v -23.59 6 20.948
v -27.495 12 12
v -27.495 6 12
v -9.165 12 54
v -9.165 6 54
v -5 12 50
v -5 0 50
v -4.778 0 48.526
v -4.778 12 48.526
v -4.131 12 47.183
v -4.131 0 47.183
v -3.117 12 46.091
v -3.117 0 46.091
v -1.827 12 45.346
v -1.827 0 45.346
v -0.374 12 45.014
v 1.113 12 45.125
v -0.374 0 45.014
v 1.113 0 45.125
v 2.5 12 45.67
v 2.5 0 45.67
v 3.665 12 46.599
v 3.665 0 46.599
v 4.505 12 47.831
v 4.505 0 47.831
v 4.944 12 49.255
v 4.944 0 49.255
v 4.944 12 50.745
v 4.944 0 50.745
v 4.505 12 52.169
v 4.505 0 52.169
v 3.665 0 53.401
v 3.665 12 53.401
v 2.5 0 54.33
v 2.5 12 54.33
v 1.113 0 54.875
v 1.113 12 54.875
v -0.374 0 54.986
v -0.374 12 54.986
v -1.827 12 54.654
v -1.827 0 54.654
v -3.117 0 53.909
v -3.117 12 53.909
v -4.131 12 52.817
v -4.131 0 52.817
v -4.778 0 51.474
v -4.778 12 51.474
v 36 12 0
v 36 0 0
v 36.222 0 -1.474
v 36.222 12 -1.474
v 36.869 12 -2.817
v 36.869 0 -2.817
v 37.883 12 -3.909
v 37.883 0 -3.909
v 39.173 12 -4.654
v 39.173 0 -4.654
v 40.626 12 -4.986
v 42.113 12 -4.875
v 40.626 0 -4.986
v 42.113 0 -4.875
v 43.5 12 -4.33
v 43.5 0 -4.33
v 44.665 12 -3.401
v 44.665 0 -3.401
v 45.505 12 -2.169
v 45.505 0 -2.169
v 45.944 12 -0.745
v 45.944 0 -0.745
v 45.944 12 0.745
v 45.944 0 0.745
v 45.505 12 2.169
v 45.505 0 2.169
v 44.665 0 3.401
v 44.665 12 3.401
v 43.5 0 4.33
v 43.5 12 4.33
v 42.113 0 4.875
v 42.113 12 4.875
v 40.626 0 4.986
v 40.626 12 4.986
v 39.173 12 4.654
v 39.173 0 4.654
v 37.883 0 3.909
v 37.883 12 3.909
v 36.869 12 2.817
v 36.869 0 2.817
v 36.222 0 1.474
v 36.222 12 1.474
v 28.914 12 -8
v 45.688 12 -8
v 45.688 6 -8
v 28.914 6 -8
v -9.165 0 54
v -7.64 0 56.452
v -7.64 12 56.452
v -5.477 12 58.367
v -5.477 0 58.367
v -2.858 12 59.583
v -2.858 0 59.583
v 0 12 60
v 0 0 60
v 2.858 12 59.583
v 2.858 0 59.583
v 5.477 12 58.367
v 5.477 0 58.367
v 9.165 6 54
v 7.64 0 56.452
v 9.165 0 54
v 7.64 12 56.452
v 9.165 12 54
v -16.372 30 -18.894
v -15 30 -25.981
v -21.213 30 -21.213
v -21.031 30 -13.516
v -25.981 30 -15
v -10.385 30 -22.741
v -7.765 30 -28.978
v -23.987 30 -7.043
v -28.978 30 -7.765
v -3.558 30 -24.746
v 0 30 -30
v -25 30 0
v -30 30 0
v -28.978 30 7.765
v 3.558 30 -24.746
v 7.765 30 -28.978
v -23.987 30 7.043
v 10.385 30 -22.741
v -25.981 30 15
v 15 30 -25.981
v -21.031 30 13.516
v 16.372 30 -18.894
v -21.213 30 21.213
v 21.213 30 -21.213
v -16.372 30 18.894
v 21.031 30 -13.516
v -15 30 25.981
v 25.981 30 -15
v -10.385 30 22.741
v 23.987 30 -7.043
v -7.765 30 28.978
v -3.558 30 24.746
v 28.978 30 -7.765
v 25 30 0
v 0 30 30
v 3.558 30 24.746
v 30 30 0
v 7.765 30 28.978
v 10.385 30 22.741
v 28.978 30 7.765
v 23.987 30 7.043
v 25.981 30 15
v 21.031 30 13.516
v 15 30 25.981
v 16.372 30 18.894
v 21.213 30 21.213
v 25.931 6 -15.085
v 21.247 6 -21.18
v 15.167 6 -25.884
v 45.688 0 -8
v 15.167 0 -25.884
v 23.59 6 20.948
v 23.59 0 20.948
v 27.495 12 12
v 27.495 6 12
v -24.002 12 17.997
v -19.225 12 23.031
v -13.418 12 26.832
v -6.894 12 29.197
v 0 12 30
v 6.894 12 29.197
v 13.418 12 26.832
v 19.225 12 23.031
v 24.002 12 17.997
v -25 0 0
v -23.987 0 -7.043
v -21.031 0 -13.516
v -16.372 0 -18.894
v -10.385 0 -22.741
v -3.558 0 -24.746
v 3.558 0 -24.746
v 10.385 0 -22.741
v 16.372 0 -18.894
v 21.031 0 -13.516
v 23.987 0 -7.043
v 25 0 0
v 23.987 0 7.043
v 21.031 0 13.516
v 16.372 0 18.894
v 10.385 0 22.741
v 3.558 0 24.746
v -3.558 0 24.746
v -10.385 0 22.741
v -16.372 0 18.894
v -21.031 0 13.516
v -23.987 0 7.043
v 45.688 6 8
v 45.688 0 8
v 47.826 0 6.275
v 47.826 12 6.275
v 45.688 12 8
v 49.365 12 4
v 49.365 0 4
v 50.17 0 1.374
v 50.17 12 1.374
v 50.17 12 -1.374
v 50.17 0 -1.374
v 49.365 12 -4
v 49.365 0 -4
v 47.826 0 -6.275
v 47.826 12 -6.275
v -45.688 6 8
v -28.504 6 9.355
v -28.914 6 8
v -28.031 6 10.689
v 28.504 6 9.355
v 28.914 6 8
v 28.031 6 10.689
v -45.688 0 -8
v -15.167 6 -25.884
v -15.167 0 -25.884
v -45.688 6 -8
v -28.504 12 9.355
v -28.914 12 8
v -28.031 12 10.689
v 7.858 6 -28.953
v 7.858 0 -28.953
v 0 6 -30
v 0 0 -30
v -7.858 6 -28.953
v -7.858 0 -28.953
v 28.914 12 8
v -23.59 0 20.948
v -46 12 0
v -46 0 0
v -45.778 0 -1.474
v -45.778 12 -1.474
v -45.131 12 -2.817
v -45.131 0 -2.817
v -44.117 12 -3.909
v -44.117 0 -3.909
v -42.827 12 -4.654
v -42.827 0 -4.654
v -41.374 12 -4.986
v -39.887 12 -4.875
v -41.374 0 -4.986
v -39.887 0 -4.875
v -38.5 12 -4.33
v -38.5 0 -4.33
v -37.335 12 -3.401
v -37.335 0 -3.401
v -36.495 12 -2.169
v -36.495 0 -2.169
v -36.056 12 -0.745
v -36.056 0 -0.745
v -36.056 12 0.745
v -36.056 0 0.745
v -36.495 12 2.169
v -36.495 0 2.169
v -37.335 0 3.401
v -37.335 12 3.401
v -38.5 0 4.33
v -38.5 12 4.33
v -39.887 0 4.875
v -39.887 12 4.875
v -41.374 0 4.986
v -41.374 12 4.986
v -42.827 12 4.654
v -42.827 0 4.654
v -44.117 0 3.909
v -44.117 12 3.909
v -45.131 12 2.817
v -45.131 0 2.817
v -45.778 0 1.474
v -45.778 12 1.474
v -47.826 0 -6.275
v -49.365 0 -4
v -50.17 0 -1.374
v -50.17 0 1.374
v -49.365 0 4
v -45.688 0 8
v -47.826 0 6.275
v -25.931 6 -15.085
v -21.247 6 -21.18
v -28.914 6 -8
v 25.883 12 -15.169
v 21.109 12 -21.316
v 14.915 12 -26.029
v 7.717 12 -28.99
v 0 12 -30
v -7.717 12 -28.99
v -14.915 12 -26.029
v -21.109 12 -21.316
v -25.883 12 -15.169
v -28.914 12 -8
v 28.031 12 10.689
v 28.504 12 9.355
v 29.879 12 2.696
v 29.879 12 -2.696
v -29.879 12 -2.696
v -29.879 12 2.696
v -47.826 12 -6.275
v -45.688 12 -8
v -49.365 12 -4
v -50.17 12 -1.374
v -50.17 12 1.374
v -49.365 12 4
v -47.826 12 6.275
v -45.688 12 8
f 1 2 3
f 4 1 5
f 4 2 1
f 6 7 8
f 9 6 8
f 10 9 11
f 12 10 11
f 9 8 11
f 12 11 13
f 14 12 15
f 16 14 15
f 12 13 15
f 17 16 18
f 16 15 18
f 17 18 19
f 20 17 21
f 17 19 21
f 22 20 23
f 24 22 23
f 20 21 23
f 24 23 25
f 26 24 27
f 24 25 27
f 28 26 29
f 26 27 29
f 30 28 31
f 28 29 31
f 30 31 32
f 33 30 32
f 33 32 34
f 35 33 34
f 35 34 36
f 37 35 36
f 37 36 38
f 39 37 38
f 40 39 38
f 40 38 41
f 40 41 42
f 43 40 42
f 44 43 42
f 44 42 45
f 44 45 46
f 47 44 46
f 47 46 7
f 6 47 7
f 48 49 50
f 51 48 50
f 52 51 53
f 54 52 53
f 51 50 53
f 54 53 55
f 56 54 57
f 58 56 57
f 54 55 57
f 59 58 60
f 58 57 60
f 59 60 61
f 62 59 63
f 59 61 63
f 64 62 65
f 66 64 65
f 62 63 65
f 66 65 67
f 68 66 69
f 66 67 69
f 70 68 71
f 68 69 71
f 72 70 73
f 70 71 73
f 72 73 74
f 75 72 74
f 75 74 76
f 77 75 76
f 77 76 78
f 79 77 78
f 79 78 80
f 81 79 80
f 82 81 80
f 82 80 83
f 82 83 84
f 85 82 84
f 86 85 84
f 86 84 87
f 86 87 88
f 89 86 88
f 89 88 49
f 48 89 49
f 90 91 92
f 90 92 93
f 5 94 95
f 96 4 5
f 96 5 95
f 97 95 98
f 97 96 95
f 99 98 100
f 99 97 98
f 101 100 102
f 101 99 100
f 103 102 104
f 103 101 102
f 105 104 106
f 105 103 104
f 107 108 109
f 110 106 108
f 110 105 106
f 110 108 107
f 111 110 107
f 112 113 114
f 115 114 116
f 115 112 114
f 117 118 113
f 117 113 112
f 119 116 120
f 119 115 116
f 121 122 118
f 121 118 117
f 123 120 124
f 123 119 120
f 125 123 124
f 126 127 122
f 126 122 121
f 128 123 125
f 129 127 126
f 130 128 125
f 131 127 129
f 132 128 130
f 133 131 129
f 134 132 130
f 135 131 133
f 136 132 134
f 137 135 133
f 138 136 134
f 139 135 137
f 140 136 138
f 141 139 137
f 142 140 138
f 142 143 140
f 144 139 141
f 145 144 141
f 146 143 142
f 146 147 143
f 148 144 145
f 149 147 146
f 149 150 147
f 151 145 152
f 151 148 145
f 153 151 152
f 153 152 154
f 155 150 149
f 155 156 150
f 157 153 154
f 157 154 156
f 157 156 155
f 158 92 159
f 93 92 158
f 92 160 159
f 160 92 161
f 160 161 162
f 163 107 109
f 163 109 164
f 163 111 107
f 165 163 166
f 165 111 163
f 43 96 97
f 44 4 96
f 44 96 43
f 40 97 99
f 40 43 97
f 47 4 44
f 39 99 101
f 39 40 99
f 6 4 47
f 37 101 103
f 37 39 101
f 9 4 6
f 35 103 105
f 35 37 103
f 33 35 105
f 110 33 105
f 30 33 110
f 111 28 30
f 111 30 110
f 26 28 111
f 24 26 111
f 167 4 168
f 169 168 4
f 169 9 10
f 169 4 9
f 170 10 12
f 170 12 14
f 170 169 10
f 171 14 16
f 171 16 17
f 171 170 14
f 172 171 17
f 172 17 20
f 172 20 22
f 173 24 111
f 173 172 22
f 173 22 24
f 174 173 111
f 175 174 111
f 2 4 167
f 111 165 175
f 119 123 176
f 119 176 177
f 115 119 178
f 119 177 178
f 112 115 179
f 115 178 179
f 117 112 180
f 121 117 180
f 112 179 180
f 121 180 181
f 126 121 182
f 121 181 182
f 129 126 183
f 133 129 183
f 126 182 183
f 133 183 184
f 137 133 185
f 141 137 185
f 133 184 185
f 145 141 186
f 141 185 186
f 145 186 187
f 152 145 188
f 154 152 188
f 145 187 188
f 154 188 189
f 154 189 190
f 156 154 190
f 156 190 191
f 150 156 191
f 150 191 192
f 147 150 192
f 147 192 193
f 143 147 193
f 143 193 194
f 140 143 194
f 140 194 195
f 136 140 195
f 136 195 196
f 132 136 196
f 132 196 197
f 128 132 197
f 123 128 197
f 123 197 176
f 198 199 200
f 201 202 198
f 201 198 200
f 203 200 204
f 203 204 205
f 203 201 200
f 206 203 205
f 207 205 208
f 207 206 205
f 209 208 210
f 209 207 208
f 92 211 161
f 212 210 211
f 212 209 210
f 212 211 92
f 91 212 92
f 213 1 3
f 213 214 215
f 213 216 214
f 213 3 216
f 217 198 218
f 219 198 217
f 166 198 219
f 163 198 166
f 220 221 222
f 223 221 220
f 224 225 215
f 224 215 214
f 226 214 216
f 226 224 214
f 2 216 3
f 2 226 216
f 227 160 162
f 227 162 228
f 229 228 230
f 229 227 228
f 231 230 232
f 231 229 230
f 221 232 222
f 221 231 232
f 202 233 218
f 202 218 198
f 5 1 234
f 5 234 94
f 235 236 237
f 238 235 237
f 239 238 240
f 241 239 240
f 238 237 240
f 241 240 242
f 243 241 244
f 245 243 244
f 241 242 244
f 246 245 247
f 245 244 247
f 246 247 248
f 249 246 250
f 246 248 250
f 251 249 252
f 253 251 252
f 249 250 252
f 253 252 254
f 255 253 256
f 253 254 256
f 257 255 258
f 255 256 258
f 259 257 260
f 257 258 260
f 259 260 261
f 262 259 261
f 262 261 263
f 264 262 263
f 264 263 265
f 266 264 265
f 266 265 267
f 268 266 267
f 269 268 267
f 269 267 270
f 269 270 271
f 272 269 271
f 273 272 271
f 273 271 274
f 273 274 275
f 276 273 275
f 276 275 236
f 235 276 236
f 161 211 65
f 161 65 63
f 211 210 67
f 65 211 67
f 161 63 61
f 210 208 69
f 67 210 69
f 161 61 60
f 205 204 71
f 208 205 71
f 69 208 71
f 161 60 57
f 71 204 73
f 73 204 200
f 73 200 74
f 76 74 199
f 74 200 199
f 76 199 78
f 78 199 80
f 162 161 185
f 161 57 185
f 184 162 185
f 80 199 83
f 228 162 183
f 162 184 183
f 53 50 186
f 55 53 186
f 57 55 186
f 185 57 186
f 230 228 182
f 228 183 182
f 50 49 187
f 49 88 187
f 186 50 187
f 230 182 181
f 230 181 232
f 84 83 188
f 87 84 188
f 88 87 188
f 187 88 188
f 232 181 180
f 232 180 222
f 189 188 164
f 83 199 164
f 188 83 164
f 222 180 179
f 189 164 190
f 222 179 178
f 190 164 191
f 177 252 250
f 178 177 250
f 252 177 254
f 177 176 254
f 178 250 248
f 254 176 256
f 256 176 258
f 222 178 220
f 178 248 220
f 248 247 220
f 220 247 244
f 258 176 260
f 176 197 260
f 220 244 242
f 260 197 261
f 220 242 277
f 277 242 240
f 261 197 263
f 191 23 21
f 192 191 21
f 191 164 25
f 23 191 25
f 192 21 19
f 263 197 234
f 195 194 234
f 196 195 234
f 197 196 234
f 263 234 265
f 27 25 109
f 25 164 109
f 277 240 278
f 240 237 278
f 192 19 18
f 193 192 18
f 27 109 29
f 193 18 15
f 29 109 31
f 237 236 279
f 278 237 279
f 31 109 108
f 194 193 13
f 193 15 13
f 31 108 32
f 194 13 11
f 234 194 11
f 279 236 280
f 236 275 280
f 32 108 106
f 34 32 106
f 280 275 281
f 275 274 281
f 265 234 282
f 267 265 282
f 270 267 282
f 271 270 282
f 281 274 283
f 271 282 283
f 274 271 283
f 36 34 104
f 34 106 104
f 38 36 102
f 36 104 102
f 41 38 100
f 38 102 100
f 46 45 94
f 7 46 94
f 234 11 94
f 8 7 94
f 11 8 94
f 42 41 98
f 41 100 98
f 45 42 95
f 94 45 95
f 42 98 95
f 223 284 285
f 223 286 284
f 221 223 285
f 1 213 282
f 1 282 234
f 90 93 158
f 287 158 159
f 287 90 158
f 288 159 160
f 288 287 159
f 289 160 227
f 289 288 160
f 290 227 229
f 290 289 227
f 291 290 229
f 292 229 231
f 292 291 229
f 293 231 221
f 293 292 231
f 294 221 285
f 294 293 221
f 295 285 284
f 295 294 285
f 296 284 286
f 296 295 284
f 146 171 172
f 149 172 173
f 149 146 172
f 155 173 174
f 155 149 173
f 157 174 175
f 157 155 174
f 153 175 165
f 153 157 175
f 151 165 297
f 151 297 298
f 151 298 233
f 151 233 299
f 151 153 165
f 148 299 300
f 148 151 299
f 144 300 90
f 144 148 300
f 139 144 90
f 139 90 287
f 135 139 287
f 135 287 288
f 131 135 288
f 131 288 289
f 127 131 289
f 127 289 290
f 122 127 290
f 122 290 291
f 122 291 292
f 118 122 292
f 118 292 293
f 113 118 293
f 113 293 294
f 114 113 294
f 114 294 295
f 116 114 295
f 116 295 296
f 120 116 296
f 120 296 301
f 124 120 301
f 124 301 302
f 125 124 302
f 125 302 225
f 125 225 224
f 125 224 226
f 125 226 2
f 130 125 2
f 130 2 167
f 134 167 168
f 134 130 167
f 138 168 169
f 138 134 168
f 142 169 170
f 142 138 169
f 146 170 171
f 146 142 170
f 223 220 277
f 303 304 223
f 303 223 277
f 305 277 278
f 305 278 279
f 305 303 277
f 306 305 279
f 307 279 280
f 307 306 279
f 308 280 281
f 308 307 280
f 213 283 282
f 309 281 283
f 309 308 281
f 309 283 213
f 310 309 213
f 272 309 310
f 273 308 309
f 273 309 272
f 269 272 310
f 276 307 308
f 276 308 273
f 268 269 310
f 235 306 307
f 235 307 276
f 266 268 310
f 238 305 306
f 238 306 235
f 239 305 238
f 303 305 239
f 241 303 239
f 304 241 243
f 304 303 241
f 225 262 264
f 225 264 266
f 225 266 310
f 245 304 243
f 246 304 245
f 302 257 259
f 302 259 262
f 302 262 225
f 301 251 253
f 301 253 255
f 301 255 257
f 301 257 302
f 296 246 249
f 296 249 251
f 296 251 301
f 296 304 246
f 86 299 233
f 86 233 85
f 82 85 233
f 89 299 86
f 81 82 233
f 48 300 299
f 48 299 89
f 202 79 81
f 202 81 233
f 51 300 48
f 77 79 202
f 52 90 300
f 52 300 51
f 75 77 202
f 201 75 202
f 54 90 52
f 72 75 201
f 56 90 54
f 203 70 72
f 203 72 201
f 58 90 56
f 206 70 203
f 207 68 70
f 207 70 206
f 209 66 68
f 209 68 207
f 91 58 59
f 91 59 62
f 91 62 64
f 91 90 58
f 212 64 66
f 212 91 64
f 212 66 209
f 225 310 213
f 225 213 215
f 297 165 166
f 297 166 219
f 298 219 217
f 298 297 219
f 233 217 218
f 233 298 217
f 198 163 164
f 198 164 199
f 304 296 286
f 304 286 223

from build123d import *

# Parameters (mm, degrees)
BOSS_EXTRUDE1_DEPTH        = 6
BOSS_EXTRUDE2_DEPTH        = 6
BOSS_EXTRUDE3_START        = 18
SKETCH3_R                  = 30
BOSS_EXTRUDE3_DEPTH        = 18
F_10_0_10_DIAMETER_HOLE1_D = 10
M45_CLEARANCE_HOLE1_D      = 50


with BuildPart() as part:
    # Sketch1 → Boss-Extrude1 (new body)
    with BuildSketch(Plane(origin=(0, 12, 0), x_dir=(1, 0, 0), z_dir=(0, 1, 0))):
        with BuildLine():
            Line((-45.687618347, -8), (-28.91366459, -8))
            ThreePointArc((-28.91366459, -8), (-28.275380984, -10.025109984), (-27.49545417, -12))
            Line((-27.49545417, -12), (-9.16515139, -54))
            ThreePointArc((-9.16515139, -54), (0, -60), (9.16515139, -54))
            Line((9.16515139, -54), (27.49545417, -12))
            ThreePointArc((27.49545417, -12), (28.275380984, -10.025109984), (28.91366459, -8))
            Line((28.91366459, -8), (45.687618347, -8))
            ThreePointArc((45.687618347, -8), (50.272203932, 0), (45.687618347, 8))
            Line((45.687618347, 8), (28.91366459, 8))
            ThreePointArc((28.91366459, 8), (0, 30), (-28.91366459, 8))
            Line((-28.91366459, 8), (-45.687618347, 8))
            ThreePointArc((-45.687618347, 8), (-50.272203932, 0), (-45.687618347, -8))
        make_face()
    extrude(amount=-BOSS_EXTRUDE1_DEPTH)

    # Sketch2 → Boss-Extrude2 (add)
    with BuildSketch(Plane.XZ.offset(-6)):
        with BuildLine():
            Line((-15.16668005, -25.883813789), (-45.687618347, -8))
            ThreePointArc((-45.687618347, -8), (-50.272203932, 0), (-45.687618347, 8))
            Line((-45.687618347, 8), (-23.590216691, 20.948023176))
            Line((-23.590216691, 20.948023176), (-9.16515139, 54))
            ThreePointArc((-9.16515139, 54), (0, 60), (9.16515139, 54))
            Line((9.16515139, 54), (23.590216691, 20.948023176))
            Line((23.590216691, 20.948023176), (45.687618347, 8))
            ThreePointArc((45.687618347, 8), (50.272203932, 0), (45.687618347, -8))
            Line((45.687618347, -8), (15.16668005, -25.883813789))
            ThreePointArc((15.16668005, -25.883813789), (0, -30), (-15.16668005, -25.883813789))
        make_face()
    extrude(amount=BOSS_EXTRUDE2_DEPTH)

    # Sketch3 → Boss-Extrude3 (add)
    with BuildSketch(Plane(origin=(0, 12, 0), x_dir=(-1, 0, 0), z_dir=(0, 1, 0)).offset(BOSS_EXTRUDE3_START)):
        with Locations(Location((0, 0, 0), (0, 0, 90))):
            Circle(SKETCH3_R)
    extrude(amount=-BOSS_EXTRUDE3_DEPTH)

    # Ø10.0 (10) Diameter Hole1 (through all)
    with Locations(Plane(origin=(0, 12, 0), x_dir=(1, 0, 0), z_dir=(0, 1, 0))):
        with Locations((-41, 0), (41, 0), (0, -50)):
            Hole(F_10_0_10_DIAMETER_HOLE1_D / 2)

    # M45 Clearance Hole1 (through all)
    with Locations(Plane(origin=(0, 30, 0), x_dir=(1, 0, 0), z_dir=(0, 1, 0))):
        with Locations((0, 0)):
            Hole(M45_CLEARANCE_HOLE1_D / 2)


solid = part.part
